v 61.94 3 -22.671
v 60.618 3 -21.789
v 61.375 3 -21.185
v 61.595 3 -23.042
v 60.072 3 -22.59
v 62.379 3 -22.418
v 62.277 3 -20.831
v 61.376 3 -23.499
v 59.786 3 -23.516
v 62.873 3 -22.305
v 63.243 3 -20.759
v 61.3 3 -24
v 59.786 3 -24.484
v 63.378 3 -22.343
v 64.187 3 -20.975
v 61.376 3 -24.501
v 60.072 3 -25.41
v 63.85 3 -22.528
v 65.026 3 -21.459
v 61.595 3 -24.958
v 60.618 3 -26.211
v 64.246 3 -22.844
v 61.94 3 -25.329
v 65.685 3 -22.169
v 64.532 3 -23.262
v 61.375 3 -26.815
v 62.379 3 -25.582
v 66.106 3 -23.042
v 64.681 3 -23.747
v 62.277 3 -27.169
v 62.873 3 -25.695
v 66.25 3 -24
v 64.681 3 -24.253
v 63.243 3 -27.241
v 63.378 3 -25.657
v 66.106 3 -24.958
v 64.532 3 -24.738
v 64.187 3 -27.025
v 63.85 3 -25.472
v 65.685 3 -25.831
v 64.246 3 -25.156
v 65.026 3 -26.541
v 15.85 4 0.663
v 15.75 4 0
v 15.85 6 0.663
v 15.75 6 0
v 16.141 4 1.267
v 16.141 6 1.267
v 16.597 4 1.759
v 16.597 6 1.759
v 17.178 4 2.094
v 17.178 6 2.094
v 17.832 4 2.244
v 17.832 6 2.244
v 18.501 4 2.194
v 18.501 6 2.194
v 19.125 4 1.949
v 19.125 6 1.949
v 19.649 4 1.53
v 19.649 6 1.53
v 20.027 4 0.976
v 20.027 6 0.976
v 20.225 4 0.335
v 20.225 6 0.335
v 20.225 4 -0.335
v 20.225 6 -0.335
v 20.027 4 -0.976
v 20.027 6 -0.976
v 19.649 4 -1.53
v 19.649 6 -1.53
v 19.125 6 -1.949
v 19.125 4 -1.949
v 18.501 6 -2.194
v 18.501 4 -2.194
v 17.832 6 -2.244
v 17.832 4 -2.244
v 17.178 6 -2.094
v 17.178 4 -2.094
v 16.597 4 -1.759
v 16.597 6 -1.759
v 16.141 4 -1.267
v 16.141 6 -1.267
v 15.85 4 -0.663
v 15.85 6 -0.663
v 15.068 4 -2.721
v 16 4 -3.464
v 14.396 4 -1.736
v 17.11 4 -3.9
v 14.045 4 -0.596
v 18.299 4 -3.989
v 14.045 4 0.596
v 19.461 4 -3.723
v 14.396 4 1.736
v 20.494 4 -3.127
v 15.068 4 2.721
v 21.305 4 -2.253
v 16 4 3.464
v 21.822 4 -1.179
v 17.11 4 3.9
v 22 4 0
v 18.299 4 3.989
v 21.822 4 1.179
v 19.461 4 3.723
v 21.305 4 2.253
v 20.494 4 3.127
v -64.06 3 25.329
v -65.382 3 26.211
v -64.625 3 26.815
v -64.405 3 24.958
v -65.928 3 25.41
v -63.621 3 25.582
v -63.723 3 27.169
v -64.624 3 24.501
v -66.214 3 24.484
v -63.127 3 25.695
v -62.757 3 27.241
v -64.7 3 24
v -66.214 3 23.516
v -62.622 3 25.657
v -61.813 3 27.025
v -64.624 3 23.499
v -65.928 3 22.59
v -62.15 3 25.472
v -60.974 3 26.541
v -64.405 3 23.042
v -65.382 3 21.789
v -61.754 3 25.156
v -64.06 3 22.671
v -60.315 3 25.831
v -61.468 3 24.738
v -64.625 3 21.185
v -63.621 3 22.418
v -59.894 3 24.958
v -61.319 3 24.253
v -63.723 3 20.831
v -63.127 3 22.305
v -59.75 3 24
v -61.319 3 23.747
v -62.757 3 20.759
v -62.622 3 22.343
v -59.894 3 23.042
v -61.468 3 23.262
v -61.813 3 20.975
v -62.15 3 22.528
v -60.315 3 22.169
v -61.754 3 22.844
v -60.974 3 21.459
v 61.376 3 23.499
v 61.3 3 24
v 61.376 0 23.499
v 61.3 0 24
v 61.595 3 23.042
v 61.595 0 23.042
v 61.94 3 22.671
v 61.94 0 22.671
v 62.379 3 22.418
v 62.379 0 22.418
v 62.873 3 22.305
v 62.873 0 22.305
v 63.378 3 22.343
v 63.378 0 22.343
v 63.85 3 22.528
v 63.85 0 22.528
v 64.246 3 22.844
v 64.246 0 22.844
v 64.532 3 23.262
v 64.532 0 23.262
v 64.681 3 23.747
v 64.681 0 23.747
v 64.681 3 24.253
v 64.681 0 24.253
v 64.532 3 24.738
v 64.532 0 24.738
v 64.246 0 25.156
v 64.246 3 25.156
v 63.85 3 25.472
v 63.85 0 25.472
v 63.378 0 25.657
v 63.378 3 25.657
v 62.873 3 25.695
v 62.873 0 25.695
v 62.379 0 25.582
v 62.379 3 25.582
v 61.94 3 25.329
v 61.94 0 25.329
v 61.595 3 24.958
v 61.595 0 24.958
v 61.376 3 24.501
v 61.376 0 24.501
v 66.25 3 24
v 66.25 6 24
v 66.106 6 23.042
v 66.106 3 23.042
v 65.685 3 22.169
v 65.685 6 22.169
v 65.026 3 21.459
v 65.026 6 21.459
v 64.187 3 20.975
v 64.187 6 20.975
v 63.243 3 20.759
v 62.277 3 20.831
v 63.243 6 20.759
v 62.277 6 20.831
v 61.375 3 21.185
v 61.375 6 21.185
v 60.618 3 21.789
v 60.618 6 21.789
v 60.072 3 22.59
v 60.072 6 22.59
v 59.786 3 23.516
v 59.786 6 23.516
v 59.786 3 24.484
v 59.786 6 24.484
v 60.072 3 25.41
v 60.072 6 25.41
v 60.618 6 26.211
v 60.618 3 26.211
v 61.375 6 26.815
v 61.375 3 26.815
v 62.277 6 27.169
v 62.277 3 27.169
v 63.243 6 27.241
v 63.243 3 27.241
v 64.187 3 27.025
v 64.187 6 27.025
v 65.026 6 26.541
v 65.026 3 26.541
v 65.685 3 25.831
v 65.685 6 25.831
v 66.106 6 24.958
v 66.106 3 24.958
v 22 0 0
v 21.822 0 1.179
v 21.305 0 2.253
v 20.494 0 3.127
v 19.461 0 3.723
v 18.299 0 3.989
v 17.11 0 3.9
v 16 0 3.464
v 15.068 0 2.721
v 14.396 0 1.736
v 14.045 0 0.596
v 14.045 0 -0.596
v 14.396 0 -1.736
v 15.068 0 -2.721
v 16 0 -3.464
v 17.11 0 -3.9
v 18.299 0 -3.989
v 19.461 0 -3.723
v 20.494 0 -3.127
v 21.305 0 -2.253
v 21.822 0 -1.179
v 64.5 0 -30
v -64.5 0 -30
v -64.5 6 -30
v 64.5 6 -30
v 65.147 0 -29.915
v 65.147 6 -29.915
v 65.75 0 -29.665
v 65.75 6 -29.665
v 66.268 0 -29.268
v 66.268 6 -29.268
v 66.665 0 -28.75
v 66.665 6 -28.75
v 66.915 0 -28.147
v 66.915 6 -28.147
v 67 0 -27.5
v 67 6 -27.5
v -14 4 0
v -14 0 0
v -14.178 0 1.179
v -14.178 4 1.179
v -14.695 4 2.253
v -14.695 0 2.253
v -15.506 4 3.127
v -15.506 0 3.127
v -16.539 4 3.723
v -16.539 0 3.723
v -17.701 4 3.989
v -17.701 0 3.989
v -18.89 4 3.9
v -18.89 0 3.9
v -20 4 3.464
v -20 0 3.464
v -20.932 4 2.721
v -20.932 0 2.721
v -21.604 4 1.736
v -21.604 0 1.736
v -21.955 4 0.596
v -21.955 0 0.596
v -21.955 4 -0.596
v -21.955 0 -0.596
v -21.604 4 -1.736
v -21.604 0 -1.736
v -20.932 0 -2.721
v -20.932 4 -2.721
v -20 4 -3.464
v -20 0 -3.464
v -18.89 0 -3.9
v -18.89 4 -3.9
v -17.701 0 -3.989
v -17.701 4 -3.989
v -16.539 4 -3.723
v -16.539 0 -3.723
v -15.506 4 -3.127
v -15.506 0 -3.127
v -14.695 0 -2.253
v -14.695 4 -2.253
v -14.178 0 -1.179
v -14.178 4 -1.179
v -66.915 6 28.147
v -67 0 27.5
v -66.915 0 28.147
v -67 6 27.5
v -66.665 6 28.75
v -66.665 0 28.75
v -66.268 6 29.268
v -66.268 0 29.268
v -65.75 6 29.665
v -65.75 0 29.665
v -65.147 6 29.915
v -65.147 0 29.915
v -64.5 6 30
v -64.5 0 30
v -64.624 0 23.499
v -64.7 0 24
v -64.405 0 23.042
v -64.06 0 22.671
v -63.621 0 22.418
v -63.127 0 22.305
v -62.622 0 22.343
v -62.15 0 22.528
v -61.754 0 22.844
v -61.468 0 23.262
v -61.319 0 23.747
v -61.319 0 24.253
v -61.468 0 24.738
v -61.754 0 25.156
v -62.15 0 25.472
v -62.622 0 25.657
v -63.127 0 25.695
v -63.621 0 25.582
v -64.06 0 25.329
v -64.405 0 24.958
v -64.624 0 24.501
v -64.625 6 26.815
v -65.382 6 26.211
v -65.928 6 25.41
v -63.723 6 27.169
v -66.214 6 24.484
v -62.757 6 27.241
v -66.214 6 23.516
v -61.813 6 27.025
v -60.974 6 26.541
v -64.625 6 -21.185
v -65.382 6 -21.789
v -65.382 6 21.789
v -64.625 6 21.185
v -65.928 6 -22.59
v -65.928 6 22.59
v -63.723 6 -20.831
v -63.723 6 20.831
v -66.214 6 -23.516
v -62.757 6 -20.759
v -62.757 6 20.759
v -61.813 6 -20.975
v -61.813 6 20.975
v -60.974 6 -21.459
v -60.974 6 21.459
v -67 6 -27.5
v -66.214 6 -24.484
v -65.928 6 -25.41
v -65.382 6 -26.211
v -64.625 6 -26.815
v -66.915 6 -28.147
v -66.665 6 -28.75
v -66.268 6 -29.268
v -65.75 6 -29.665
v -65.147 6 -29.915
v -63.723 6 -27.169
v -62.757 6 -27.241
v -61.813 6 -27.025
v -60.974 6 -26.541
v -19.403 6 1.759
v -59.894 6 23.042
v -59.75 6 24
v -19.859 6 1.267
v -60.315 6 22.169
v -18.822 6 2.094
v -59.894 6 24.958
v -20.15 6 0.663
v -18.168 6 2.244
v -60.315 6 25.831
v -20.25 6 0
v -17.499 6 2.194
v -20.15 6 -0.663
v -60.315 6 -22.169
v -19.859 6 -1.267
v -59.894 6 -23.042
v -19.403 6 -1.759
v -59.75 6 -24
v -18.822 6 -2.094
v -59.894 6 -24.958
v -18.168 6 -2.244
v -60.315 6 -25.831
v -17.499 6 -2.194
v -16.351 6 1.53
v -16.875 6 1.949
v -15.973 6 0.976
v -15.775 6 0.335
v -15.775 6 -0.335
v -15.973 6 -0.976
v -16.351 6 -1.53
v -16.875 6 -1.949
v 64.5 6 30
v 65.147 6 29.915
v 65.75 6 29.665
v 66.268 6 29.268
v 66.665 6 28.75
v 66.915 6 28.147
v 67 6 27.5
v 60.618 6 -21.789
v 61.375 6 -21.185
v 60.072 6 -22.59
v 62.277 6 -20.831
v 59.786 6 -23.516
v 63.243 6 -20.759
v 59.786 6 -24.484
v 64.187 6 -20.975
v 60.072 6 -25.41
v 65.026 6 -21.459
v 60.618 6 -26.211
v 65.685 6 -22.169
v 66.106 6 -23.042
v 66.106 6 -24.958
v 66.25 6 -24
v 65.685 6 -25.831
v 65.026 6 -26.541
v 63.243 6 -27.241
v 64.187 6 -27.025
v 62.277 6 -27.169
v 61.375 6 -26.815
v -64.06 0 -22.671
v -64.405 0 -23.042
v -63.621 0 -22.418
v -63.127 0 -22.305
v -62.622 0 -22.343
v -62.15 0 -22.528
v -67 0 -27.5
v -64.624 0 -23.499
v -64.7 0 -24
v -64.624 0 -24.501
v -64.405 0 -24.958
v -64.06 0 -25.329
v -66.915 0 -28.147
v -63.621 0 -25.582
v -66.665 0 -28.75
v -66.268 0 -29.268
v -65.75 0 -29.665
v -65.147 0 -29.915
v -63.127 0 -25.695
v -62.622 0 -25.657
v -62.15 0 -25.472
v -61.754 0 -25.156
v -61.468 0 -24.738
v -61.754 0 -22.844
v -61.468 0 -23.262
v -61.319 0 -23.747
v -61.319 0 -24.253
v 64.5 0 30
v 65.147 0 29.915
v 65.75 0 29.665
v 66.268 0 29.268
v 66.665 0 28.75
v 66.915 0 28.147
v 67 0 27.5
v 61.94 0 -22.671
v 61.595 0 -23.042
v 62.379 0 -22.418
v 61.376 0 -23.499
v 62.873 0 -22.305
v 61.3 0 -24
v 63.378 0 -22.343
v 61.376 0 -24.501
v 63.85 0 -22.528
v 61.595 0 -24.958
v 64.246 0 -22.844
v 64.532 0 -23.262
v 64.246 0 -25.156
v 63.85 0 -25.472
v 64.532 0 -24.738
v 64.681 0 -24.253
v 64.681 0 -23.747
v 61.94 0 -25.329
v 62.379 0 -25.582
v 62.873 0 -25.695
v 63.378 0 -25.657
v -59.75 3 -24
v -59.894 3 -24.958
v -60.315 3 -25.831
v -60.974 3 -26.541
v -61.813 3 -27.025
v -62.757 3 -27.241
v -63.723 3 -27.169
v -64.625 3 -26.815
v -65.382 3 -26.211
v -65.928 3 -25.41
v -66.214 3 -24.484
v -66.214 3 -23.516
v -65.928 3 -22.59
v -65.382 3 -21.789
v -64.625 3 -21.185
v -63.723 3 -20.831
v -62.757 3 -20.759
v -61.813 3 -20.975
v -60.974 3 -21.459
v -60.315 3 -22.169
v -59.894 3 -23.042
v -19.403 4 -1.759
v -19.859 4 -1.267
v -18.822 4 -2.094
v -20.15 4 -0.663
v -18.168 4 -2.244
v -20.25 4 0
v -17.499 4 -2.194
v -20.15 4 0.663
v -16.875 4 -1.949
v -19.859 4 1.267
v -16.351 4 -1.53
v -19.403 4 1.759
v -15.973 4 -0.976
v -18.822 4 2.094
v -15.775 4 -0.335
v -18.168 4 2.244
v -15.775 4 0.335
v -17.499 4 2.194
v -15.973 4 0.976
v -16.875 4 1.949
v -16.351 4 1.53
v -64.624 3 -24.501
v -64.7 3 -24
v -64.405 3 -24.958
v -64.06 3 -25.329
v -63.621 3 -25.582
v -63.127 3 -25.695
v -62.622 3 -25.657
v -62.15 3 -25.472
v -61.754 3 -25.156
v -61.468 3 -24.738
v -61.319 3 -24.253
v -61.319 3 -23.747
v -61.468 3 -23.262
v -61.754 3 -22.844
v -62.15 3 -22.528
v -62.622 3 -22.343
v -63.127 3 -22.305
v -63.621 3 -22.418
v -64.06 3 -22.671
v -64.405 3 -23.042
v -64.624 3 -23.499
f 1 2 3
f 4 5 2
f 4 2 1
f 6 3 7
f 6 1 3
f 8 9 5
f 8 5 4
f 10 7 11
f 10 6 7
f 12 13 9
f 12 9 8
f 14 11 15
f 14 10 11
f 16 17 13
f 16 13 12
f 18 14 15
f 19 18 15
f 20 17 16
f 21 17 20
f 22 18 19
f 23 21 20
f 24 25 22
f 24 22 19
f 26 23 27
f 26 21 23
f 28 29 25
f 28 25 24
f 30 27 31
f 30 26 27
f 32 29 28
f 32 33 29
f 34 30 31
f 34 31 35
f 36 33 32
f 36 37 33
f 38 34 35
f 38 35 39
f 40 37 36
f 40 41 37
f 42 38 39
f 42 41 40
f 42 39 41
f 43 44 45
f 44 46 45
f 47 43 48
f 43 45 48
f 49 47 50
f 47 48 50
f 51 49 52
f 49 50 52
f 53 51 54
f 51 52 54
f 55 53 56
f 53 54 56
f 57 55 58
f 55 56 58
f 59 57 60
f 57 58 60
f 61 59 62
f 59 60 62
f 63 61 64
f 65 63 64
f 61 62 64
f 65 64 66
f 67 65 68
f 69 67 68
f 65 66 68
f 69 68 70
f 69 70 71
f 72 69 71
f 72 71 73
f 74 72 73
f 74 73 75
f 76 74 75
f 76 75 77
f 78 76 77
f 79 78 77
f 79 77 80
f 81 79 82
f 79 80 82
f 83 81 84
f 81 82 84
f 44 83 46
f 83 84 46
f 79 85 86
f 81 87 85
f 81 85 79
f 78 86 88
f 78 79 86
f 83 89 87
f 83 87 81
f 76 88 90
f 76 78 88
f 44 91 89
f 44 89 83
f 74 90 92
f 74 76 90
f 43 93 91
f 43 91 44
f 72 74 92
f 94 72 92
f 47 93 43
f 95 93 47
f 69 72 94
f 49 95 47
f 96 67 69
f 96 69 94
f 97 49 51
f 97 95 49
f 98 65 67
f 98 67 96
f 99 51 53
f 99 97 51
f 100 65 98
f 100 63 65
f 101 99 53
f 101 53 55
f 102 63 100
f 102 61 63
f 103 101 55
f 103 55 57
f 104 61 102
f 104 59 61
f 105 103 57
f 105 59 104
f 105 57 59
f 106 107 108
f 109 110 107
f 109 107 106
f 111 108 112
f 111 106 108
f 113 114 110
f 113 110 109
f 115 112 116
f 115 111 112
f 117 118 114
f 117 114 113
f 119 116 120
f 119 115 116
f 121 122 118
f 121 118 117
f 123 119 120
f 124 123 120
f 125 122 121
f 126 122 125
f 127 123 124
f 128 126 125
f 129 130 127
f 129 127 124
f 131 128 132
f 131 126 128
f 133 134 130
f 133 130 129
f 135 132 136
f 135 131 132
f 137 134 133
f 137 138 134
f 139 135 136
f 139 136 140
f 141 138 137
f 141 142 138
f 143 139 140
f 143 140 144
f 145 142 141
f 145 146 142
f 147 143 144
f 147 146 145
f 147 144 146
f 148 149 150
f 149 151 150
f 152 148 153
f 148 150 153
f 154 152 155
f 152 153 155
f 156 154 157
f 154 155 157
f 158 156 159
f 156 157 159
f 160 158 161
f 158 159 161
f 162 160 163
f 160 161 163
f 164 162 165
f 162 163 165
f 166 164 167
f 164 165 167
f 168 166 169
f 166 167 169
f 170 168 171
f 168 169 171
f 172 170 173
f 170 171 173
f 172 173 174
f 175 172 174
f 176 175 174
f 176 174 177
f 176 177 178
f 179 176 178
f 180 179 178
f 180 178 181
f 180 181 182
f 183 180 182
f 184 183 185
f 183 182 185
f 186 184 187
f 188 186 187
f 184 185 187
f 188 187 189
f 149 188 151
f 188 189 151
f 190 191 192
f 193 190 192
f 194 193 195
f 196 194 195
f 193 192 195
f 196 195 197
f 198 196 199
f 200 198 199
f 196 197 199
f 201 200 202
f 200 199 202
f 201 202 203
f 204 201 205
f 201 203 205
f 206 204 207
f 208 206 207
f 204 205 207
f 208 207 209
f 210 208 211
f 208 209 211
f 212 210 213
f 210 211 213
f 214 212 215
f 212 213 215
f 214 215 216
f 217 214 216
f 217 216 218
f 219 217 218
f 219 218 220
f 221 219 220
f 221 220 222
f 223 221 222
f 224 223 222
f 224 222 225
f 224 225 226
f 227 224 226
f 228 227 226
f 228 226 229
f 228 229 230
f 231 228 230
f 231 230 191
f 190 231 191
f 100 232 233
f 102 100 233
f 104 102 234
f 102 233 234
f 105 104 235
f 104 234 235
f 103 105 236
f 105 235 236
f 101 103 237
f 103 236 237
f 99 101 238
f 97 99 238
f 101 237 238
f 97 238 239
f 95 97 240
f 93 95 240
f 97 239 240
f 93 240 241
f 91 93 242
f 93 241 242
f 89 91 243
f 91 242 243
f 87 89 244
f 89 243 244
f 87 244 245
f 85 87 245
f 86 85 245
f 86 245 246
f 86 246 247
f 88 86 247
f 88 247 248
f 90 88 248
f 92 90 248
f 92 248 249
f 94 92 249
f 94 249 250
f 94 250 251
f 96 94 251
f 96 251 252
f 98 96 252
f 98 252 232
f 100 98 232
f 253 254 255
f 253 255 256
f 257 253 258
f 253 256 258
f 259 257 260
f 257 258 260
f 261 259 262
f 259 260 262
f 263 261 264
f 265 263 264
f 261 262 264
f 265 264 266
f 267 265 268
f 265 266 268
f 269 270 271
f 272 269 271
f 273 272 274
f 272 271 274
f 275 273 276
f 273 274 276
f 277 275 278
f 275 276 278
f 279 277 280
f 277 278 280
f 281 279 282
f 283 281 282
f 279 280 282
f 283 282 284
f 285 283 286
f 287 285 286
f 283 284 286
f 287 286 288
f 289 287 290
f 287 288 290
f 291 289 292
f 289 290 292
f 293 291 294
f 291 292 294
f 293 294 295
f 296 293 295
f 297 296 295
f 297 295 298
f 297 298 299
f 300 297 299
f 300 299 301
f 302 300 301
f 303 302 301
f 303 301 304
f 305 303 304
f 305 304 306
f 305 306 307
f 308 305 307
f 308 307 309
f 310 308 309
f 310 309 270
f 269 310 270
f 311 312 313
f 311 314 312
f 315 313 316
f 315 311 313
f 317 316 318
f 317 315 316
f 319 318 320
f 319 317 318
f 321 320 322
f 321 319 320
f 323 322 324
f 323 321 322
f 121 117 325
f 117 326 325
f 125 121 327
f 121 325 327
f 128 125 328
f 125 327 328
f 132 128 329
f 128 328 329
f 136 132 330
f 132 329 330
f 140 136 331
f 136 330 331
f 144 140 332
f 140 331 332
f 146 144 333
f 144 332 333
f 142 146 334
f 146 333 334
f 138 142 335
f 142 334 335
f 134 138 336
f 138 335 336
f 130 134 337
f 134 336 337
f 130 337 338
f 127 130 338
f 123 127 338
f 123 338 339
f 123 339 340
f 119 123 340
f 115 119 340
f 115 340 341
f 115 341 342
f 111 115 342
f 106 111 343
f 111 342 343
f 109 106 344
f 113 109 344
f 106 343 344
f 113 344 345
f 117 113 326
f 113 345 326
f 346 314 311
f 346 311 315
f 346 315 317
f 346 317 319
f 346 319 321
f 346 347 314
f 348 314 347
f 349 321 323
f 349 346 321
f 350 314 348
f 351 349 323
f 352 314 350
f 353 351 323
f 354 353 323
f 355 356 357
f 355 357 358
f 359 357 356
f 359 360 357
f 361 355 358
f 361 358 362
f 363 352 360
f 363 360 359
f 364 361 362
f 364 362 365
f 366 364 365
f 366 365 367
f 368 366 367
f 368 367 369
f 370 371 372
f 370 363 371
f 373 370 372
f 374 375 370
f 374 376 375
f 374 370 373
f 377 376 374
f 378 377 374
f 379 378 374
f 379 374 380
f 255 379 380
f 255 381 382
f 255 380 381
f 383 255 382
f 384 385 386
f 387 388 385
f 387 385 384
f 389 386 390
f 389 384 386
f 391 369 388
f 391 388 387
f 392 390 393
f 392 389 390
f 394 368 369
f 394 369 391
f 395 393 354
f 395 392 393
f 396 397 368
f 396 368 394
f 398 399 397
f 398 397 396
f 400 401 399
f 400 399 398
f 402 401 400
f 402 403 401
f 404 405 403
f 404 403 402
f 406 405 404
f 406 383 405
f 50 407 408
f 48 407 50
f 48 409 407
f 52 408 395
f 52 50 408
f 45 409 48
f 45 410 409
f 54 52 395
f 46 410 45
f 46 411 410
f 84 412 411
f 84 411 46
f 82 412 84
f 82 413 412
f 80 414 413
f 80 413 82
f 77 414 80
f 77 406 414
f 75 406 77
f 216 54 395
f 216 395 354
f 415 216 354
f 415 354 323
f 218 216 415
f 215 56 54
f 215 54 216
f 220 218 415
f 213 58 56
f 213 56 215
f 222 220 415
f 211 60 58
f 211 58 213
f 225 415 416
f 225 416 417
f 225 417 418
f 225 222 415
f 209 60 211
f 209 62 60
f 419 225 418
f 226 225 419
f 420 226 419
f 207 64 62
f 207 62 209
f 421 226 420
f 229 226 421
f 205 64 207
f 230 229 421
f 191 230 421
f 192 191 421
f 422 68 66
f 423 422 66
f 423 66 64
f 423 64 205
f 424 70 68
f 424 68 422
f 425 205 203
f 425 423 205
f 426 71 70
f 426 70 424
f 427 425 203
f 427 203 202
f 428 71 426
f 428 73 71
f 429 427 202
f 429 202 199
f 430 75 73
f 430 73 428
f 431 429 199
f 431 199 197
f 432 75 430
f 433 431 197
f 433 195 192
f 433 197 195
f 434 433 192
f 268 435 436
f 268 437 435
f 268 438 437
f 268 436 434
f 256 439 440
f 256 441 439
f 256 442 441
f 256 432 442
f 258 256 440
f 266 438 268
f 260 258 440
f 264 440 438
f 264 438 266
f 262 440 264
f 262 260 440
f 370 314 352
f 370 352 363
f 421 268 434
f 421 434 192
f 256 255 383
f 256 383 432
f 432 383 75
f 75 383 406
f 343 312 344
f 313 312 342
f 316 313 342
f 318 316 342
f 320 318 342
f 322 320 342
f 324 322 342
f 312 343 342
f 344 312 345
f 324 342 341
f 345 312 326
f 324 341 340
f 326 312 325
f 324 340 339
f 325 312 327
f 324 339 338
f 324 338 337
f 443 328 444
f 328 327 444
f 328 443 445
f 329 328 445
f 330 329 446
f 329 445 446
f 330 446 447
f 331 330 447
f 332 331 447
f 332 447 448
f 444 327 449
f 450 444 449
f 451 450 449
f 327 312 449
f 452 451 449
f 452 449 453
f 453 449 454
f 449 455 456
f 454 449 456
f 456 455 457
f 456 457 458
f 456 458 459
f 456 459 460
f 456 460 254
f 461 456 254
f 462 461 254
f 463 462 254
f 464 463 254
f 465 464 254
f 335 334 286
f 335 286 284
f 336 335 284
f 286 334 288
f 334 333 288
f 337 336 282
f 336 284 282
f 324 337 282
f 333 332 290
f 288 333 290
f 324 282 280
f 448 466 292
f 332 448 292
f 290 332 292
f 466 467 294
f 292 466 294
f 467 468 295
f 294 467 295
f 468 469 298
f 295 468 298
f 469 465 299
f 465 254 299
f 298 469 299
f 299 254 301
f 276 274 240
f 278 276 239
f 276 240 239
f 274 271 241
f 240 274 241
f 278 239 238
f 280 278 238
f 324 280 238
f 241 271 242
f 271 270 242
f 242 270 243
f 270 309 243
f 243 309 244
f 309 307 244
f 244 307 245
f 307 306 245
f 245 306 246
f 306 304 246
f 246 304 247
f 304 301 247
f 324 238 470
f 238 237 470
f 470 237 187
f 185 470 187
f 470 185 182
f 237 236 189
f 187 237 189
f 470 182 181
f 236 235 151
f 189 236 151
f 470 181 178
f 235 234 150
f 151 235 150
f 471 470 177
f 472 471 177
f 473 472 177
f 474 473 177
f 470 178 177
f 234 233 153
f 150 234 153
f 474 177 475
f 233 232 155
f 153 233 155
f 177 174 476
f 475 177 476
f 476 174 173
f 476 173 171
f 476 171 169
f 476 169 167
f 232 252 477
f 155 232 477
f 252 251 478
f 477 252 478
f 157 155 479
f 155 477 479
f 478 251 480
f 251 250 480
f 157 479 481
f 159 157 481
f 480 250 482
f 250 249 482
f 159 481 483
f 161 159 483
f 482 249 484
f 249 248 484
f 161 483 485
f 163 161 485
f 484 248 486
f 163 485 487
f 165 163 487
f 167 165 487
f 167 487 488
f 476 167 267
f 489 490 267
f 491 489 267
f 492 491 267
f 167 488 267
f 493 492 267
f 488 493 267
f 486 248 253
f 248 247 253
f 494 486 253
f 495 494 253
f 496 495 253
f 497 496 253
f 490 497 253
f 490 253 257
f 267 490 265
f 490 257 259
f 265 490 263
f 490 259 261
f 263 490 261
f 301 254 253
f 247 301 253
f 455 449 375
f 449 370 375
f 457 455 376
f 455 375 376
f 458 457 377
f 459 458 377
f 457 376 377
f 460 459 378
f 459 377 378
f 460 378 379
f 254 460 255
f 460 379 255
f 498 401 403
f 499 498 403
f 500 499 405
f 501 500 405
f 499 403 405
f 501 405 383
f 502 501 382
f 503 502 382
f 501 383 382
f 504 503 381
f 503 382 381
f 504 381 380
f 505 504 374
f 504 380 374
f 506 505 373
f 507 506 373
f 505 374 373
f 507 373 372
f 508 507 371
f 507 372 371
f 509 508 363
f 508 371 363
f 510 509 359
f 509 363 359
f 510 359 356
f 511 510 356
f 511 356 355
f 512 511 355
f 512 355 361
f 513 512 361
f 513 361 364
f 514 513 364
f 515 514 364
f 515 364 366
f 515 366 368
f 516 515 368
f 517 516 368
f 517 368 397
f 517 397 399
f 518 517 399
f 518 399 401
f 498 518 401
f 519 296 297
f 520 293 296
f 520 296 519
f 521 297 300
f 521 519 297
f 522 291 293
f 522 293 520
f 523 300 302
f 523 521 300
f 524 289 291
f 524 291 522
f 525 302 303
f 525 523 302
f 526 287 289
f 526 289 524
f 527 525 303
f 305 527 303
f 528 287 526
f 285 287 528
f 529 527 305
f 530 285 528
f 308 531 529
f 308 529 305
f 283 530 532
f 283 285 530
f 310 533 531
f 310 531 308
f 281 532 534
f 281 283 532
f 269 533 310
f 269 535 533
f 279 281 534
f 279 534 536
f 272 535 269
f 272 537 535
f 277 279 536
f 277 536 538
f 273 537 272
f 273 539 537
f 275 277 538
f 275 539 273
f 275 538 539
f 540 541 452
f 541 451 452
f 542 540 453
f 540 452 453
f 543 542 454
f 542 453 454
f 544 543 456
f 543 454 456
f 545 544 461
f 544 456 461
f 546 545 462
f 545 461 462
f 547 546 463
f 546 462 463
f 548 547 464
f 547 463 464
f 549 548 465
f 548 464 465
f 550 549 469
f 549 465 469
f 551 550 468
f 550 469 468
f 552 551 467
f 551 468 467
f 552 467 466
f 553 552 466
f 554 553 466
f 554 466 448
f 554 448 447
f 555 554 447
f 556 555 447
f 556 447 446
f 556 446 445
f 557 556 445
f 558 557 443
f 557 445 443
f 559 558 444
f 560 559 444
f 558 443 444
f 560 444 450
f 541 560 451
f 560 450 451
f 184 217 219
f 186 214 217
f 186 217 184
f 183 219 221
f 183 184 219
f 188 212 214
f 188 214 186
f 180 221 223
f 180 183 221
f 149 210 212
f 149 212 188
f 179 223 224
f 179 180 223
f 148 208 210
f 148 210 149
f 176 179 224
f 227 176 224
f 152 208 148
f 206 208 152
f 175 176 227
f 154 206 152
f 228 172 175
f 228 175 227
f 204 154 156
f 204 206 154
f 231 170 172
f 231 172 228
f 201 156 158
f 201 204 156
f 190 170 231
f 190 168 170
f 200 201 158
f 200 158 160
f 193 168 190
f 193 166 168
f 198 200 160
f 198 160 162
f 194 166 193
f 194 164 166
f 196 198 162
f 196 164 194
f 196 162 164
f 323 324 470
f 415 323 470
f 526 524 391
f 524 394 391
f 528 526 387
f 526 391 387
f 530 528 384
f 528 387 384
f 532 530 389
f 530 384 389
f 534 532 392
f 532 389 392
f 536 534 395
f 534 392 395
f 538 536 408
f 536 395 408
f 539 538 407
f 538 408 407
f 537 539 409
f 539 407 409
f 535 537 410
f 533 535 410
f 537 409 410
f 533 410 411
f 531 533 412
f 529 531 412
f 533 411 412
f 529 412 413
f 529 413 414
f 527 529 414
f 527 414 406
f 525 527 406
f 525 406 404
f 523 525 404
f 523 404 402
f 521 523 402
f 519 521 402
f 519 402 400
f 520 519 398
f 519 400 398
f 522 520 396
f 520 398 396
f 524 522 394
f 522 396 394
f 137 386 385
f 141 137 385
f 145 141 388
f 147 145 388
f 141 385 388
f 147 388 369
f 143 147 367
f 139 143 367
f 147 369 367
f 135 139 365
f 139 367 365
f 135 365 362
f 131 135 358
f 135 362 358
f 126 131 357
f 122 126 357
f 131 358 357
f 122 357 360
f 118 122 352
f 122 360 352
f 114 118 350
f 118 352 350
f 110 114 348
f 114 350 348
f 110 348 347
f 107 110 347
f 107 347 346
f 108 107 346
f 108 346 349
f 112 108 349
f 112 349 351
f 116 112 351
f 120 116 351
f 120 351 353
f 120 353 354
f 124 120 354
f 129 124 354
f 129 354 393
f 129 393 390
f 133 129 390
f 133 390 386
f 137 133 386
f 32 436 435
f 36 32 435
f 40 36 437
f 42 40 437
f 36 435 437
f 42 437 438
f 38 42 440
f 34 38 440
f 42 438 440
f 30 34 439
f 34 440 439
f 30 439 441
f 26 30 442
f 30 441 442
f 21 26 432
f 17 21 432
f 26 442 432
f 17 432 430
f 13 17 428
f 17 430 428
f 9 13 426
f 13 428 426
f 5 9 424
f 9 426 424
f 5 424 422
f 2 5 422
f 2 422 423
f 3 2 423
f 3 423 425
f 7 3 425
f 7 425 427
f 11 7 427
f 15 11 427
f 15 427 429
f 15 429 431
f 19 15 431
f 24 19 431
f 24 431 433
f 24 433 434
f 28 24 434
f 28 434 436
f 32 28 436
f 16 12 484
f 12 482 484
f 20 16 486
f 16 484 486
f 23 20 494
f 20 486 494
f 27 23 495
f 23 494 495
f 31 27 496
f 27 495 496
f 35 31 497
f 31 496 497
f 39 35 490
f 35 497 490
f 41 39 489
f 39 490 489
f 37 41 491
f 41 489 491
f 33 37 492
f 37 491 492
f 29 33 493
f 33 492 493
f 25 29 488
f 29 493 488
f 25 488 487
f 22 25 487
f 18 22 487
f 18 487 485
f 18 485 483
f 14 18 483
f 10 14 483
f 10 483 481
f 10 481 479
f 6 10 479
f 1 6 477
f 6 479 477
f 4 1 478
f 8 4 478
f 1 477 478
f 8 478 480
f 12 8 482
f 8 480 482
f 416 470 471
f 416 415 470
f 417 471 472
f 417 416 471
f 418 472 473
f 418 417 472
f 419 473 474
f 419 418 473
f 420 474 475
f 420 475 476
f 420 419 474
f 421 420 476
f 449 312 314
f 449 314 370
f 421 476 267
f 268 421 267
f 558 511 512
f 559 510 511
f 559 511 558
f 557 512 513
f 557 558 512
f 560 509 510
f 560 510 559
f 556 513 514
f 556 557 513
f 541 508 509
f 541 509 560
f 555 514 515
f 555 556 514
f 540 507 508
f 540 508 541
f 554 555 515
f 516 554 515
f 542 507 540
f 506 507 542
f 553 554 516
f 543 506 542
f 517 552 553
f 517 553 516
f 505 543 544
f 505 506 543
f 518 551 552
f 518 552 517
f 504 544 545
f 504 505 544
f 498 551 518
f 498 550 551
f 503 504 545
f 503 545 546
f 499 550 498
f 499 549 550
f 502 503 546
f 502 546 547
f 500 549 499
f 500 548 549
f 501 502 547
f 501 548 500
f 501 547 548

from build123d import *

# Parameters (mm, degrees)
SKETCH1_W                      = 134
SKETCH1_H                      = 60
BOSS_EXTRUDE1_DEPTH            = 6
CBORE_FOR_M3_SHCS1_D           = 3.4
CBORE_FOR_M3_SHCS1_DEPTH       = 17.38
CBORE_FOR_M3_SHCS1_CBORE_D     = 6.5
CBORE_FOR_M3_SHCS1_CBORE_DEPTH = 3
CBORE_FOR_M3_SHCS1_TIP         = 1.021463052
FILLET1_R                      = 2.5
CBORE_FOR_M4_SHCS1_D           = 4.5
CBORE_FOR_M4_SHCS1_DEPTH       = 12
CBORE_FOR_M4_SHCS1_CBORE_D     = 8
CBORE_FOR_M4_SHCS1_CBORE_DEPTH = 4
CBORE_FOR_M4_SHCS1_TIP         = 1.351936393


with BuildPart() as part:
    # Sketch1 → Boss-Extrude1 (new body)
    with BuildSketch(Plane(origin=(0, 0, 0), x_dir=(1, 0, 0), z_dir=(0, 1, 0))):
        Rectangle(SKETCH1_W, SKETCH1_H)
    extrude(amount=BOSS_EXTRUDE1_DEPTH)

    # CBORE for M3 SHCS1
    with Locations(Plane(origin=(0, 6, 0), x_dir=(1, 0, 0), z_dir=(0, 1, 0))):
        with Locations((-63, 24), (-63, -24), (63, -24), (63, 24)):
            CounterBoreHole(CBORE_FOR_M3_SHCS1_D / 2, CBORE_FOR_M3_SHCS1_CBORE_D / 2, CBORE_FOR_M3_SHCS1_CBORE_DEPTH, depth=CBORE_FOR_M3_SHCS1_DEPTH)
            with Locations((0, 0, -(CBORE_FOR_M3_SHCS1_DEPTH + CBORE_FOR_M3_SHCS1_TIP / 2))):  # 118° drill point
                Cone(0, CBORE_FOR_M3_SHCS1_D / 2, CBORE_FOR_M3_SHCS1_TIP, mode=Mode.SUBTRACT)

    # Fillet1
    fillet1_edges = [part.edges().sort_by_distance(p)[0] for p in [
        (67, 3, 30),
        (-67, 3, 30),
        (-67, 3, -30),
        (67, 3, -30),
    ]]
    fillet(fillet1_edges, radius=FILLET1_R)

    # CBORE for M4 SHCS1
    with Locations(Plane.XZ):
        with Locations((-18, 0), (18, 0)):
            CounterBoreHole(CBORE_FOR_M4_SHCS1_D / 2, CBORE_FOR_M4_SHCS1_CBORE_D / 2, CBORE_FOR_M4_SHCS1_CBORE_DEPTH, depth=CBORE_FOR_M4_SHCS1_DEPTH)
            with Locations((0, 0, -(CBORE_FOR_M4_SHCS1_DEPTH + CBORE_FOR_M4_SHCS1_TIP / 2))):  # 118° drill point
                Cone(0, CBORE_FOR_M4_SHCS1_D / 2, CBORE_FOR_M4_SHCS1_TIP, mode=Mode.SUBTRACT)


solid = part.part
